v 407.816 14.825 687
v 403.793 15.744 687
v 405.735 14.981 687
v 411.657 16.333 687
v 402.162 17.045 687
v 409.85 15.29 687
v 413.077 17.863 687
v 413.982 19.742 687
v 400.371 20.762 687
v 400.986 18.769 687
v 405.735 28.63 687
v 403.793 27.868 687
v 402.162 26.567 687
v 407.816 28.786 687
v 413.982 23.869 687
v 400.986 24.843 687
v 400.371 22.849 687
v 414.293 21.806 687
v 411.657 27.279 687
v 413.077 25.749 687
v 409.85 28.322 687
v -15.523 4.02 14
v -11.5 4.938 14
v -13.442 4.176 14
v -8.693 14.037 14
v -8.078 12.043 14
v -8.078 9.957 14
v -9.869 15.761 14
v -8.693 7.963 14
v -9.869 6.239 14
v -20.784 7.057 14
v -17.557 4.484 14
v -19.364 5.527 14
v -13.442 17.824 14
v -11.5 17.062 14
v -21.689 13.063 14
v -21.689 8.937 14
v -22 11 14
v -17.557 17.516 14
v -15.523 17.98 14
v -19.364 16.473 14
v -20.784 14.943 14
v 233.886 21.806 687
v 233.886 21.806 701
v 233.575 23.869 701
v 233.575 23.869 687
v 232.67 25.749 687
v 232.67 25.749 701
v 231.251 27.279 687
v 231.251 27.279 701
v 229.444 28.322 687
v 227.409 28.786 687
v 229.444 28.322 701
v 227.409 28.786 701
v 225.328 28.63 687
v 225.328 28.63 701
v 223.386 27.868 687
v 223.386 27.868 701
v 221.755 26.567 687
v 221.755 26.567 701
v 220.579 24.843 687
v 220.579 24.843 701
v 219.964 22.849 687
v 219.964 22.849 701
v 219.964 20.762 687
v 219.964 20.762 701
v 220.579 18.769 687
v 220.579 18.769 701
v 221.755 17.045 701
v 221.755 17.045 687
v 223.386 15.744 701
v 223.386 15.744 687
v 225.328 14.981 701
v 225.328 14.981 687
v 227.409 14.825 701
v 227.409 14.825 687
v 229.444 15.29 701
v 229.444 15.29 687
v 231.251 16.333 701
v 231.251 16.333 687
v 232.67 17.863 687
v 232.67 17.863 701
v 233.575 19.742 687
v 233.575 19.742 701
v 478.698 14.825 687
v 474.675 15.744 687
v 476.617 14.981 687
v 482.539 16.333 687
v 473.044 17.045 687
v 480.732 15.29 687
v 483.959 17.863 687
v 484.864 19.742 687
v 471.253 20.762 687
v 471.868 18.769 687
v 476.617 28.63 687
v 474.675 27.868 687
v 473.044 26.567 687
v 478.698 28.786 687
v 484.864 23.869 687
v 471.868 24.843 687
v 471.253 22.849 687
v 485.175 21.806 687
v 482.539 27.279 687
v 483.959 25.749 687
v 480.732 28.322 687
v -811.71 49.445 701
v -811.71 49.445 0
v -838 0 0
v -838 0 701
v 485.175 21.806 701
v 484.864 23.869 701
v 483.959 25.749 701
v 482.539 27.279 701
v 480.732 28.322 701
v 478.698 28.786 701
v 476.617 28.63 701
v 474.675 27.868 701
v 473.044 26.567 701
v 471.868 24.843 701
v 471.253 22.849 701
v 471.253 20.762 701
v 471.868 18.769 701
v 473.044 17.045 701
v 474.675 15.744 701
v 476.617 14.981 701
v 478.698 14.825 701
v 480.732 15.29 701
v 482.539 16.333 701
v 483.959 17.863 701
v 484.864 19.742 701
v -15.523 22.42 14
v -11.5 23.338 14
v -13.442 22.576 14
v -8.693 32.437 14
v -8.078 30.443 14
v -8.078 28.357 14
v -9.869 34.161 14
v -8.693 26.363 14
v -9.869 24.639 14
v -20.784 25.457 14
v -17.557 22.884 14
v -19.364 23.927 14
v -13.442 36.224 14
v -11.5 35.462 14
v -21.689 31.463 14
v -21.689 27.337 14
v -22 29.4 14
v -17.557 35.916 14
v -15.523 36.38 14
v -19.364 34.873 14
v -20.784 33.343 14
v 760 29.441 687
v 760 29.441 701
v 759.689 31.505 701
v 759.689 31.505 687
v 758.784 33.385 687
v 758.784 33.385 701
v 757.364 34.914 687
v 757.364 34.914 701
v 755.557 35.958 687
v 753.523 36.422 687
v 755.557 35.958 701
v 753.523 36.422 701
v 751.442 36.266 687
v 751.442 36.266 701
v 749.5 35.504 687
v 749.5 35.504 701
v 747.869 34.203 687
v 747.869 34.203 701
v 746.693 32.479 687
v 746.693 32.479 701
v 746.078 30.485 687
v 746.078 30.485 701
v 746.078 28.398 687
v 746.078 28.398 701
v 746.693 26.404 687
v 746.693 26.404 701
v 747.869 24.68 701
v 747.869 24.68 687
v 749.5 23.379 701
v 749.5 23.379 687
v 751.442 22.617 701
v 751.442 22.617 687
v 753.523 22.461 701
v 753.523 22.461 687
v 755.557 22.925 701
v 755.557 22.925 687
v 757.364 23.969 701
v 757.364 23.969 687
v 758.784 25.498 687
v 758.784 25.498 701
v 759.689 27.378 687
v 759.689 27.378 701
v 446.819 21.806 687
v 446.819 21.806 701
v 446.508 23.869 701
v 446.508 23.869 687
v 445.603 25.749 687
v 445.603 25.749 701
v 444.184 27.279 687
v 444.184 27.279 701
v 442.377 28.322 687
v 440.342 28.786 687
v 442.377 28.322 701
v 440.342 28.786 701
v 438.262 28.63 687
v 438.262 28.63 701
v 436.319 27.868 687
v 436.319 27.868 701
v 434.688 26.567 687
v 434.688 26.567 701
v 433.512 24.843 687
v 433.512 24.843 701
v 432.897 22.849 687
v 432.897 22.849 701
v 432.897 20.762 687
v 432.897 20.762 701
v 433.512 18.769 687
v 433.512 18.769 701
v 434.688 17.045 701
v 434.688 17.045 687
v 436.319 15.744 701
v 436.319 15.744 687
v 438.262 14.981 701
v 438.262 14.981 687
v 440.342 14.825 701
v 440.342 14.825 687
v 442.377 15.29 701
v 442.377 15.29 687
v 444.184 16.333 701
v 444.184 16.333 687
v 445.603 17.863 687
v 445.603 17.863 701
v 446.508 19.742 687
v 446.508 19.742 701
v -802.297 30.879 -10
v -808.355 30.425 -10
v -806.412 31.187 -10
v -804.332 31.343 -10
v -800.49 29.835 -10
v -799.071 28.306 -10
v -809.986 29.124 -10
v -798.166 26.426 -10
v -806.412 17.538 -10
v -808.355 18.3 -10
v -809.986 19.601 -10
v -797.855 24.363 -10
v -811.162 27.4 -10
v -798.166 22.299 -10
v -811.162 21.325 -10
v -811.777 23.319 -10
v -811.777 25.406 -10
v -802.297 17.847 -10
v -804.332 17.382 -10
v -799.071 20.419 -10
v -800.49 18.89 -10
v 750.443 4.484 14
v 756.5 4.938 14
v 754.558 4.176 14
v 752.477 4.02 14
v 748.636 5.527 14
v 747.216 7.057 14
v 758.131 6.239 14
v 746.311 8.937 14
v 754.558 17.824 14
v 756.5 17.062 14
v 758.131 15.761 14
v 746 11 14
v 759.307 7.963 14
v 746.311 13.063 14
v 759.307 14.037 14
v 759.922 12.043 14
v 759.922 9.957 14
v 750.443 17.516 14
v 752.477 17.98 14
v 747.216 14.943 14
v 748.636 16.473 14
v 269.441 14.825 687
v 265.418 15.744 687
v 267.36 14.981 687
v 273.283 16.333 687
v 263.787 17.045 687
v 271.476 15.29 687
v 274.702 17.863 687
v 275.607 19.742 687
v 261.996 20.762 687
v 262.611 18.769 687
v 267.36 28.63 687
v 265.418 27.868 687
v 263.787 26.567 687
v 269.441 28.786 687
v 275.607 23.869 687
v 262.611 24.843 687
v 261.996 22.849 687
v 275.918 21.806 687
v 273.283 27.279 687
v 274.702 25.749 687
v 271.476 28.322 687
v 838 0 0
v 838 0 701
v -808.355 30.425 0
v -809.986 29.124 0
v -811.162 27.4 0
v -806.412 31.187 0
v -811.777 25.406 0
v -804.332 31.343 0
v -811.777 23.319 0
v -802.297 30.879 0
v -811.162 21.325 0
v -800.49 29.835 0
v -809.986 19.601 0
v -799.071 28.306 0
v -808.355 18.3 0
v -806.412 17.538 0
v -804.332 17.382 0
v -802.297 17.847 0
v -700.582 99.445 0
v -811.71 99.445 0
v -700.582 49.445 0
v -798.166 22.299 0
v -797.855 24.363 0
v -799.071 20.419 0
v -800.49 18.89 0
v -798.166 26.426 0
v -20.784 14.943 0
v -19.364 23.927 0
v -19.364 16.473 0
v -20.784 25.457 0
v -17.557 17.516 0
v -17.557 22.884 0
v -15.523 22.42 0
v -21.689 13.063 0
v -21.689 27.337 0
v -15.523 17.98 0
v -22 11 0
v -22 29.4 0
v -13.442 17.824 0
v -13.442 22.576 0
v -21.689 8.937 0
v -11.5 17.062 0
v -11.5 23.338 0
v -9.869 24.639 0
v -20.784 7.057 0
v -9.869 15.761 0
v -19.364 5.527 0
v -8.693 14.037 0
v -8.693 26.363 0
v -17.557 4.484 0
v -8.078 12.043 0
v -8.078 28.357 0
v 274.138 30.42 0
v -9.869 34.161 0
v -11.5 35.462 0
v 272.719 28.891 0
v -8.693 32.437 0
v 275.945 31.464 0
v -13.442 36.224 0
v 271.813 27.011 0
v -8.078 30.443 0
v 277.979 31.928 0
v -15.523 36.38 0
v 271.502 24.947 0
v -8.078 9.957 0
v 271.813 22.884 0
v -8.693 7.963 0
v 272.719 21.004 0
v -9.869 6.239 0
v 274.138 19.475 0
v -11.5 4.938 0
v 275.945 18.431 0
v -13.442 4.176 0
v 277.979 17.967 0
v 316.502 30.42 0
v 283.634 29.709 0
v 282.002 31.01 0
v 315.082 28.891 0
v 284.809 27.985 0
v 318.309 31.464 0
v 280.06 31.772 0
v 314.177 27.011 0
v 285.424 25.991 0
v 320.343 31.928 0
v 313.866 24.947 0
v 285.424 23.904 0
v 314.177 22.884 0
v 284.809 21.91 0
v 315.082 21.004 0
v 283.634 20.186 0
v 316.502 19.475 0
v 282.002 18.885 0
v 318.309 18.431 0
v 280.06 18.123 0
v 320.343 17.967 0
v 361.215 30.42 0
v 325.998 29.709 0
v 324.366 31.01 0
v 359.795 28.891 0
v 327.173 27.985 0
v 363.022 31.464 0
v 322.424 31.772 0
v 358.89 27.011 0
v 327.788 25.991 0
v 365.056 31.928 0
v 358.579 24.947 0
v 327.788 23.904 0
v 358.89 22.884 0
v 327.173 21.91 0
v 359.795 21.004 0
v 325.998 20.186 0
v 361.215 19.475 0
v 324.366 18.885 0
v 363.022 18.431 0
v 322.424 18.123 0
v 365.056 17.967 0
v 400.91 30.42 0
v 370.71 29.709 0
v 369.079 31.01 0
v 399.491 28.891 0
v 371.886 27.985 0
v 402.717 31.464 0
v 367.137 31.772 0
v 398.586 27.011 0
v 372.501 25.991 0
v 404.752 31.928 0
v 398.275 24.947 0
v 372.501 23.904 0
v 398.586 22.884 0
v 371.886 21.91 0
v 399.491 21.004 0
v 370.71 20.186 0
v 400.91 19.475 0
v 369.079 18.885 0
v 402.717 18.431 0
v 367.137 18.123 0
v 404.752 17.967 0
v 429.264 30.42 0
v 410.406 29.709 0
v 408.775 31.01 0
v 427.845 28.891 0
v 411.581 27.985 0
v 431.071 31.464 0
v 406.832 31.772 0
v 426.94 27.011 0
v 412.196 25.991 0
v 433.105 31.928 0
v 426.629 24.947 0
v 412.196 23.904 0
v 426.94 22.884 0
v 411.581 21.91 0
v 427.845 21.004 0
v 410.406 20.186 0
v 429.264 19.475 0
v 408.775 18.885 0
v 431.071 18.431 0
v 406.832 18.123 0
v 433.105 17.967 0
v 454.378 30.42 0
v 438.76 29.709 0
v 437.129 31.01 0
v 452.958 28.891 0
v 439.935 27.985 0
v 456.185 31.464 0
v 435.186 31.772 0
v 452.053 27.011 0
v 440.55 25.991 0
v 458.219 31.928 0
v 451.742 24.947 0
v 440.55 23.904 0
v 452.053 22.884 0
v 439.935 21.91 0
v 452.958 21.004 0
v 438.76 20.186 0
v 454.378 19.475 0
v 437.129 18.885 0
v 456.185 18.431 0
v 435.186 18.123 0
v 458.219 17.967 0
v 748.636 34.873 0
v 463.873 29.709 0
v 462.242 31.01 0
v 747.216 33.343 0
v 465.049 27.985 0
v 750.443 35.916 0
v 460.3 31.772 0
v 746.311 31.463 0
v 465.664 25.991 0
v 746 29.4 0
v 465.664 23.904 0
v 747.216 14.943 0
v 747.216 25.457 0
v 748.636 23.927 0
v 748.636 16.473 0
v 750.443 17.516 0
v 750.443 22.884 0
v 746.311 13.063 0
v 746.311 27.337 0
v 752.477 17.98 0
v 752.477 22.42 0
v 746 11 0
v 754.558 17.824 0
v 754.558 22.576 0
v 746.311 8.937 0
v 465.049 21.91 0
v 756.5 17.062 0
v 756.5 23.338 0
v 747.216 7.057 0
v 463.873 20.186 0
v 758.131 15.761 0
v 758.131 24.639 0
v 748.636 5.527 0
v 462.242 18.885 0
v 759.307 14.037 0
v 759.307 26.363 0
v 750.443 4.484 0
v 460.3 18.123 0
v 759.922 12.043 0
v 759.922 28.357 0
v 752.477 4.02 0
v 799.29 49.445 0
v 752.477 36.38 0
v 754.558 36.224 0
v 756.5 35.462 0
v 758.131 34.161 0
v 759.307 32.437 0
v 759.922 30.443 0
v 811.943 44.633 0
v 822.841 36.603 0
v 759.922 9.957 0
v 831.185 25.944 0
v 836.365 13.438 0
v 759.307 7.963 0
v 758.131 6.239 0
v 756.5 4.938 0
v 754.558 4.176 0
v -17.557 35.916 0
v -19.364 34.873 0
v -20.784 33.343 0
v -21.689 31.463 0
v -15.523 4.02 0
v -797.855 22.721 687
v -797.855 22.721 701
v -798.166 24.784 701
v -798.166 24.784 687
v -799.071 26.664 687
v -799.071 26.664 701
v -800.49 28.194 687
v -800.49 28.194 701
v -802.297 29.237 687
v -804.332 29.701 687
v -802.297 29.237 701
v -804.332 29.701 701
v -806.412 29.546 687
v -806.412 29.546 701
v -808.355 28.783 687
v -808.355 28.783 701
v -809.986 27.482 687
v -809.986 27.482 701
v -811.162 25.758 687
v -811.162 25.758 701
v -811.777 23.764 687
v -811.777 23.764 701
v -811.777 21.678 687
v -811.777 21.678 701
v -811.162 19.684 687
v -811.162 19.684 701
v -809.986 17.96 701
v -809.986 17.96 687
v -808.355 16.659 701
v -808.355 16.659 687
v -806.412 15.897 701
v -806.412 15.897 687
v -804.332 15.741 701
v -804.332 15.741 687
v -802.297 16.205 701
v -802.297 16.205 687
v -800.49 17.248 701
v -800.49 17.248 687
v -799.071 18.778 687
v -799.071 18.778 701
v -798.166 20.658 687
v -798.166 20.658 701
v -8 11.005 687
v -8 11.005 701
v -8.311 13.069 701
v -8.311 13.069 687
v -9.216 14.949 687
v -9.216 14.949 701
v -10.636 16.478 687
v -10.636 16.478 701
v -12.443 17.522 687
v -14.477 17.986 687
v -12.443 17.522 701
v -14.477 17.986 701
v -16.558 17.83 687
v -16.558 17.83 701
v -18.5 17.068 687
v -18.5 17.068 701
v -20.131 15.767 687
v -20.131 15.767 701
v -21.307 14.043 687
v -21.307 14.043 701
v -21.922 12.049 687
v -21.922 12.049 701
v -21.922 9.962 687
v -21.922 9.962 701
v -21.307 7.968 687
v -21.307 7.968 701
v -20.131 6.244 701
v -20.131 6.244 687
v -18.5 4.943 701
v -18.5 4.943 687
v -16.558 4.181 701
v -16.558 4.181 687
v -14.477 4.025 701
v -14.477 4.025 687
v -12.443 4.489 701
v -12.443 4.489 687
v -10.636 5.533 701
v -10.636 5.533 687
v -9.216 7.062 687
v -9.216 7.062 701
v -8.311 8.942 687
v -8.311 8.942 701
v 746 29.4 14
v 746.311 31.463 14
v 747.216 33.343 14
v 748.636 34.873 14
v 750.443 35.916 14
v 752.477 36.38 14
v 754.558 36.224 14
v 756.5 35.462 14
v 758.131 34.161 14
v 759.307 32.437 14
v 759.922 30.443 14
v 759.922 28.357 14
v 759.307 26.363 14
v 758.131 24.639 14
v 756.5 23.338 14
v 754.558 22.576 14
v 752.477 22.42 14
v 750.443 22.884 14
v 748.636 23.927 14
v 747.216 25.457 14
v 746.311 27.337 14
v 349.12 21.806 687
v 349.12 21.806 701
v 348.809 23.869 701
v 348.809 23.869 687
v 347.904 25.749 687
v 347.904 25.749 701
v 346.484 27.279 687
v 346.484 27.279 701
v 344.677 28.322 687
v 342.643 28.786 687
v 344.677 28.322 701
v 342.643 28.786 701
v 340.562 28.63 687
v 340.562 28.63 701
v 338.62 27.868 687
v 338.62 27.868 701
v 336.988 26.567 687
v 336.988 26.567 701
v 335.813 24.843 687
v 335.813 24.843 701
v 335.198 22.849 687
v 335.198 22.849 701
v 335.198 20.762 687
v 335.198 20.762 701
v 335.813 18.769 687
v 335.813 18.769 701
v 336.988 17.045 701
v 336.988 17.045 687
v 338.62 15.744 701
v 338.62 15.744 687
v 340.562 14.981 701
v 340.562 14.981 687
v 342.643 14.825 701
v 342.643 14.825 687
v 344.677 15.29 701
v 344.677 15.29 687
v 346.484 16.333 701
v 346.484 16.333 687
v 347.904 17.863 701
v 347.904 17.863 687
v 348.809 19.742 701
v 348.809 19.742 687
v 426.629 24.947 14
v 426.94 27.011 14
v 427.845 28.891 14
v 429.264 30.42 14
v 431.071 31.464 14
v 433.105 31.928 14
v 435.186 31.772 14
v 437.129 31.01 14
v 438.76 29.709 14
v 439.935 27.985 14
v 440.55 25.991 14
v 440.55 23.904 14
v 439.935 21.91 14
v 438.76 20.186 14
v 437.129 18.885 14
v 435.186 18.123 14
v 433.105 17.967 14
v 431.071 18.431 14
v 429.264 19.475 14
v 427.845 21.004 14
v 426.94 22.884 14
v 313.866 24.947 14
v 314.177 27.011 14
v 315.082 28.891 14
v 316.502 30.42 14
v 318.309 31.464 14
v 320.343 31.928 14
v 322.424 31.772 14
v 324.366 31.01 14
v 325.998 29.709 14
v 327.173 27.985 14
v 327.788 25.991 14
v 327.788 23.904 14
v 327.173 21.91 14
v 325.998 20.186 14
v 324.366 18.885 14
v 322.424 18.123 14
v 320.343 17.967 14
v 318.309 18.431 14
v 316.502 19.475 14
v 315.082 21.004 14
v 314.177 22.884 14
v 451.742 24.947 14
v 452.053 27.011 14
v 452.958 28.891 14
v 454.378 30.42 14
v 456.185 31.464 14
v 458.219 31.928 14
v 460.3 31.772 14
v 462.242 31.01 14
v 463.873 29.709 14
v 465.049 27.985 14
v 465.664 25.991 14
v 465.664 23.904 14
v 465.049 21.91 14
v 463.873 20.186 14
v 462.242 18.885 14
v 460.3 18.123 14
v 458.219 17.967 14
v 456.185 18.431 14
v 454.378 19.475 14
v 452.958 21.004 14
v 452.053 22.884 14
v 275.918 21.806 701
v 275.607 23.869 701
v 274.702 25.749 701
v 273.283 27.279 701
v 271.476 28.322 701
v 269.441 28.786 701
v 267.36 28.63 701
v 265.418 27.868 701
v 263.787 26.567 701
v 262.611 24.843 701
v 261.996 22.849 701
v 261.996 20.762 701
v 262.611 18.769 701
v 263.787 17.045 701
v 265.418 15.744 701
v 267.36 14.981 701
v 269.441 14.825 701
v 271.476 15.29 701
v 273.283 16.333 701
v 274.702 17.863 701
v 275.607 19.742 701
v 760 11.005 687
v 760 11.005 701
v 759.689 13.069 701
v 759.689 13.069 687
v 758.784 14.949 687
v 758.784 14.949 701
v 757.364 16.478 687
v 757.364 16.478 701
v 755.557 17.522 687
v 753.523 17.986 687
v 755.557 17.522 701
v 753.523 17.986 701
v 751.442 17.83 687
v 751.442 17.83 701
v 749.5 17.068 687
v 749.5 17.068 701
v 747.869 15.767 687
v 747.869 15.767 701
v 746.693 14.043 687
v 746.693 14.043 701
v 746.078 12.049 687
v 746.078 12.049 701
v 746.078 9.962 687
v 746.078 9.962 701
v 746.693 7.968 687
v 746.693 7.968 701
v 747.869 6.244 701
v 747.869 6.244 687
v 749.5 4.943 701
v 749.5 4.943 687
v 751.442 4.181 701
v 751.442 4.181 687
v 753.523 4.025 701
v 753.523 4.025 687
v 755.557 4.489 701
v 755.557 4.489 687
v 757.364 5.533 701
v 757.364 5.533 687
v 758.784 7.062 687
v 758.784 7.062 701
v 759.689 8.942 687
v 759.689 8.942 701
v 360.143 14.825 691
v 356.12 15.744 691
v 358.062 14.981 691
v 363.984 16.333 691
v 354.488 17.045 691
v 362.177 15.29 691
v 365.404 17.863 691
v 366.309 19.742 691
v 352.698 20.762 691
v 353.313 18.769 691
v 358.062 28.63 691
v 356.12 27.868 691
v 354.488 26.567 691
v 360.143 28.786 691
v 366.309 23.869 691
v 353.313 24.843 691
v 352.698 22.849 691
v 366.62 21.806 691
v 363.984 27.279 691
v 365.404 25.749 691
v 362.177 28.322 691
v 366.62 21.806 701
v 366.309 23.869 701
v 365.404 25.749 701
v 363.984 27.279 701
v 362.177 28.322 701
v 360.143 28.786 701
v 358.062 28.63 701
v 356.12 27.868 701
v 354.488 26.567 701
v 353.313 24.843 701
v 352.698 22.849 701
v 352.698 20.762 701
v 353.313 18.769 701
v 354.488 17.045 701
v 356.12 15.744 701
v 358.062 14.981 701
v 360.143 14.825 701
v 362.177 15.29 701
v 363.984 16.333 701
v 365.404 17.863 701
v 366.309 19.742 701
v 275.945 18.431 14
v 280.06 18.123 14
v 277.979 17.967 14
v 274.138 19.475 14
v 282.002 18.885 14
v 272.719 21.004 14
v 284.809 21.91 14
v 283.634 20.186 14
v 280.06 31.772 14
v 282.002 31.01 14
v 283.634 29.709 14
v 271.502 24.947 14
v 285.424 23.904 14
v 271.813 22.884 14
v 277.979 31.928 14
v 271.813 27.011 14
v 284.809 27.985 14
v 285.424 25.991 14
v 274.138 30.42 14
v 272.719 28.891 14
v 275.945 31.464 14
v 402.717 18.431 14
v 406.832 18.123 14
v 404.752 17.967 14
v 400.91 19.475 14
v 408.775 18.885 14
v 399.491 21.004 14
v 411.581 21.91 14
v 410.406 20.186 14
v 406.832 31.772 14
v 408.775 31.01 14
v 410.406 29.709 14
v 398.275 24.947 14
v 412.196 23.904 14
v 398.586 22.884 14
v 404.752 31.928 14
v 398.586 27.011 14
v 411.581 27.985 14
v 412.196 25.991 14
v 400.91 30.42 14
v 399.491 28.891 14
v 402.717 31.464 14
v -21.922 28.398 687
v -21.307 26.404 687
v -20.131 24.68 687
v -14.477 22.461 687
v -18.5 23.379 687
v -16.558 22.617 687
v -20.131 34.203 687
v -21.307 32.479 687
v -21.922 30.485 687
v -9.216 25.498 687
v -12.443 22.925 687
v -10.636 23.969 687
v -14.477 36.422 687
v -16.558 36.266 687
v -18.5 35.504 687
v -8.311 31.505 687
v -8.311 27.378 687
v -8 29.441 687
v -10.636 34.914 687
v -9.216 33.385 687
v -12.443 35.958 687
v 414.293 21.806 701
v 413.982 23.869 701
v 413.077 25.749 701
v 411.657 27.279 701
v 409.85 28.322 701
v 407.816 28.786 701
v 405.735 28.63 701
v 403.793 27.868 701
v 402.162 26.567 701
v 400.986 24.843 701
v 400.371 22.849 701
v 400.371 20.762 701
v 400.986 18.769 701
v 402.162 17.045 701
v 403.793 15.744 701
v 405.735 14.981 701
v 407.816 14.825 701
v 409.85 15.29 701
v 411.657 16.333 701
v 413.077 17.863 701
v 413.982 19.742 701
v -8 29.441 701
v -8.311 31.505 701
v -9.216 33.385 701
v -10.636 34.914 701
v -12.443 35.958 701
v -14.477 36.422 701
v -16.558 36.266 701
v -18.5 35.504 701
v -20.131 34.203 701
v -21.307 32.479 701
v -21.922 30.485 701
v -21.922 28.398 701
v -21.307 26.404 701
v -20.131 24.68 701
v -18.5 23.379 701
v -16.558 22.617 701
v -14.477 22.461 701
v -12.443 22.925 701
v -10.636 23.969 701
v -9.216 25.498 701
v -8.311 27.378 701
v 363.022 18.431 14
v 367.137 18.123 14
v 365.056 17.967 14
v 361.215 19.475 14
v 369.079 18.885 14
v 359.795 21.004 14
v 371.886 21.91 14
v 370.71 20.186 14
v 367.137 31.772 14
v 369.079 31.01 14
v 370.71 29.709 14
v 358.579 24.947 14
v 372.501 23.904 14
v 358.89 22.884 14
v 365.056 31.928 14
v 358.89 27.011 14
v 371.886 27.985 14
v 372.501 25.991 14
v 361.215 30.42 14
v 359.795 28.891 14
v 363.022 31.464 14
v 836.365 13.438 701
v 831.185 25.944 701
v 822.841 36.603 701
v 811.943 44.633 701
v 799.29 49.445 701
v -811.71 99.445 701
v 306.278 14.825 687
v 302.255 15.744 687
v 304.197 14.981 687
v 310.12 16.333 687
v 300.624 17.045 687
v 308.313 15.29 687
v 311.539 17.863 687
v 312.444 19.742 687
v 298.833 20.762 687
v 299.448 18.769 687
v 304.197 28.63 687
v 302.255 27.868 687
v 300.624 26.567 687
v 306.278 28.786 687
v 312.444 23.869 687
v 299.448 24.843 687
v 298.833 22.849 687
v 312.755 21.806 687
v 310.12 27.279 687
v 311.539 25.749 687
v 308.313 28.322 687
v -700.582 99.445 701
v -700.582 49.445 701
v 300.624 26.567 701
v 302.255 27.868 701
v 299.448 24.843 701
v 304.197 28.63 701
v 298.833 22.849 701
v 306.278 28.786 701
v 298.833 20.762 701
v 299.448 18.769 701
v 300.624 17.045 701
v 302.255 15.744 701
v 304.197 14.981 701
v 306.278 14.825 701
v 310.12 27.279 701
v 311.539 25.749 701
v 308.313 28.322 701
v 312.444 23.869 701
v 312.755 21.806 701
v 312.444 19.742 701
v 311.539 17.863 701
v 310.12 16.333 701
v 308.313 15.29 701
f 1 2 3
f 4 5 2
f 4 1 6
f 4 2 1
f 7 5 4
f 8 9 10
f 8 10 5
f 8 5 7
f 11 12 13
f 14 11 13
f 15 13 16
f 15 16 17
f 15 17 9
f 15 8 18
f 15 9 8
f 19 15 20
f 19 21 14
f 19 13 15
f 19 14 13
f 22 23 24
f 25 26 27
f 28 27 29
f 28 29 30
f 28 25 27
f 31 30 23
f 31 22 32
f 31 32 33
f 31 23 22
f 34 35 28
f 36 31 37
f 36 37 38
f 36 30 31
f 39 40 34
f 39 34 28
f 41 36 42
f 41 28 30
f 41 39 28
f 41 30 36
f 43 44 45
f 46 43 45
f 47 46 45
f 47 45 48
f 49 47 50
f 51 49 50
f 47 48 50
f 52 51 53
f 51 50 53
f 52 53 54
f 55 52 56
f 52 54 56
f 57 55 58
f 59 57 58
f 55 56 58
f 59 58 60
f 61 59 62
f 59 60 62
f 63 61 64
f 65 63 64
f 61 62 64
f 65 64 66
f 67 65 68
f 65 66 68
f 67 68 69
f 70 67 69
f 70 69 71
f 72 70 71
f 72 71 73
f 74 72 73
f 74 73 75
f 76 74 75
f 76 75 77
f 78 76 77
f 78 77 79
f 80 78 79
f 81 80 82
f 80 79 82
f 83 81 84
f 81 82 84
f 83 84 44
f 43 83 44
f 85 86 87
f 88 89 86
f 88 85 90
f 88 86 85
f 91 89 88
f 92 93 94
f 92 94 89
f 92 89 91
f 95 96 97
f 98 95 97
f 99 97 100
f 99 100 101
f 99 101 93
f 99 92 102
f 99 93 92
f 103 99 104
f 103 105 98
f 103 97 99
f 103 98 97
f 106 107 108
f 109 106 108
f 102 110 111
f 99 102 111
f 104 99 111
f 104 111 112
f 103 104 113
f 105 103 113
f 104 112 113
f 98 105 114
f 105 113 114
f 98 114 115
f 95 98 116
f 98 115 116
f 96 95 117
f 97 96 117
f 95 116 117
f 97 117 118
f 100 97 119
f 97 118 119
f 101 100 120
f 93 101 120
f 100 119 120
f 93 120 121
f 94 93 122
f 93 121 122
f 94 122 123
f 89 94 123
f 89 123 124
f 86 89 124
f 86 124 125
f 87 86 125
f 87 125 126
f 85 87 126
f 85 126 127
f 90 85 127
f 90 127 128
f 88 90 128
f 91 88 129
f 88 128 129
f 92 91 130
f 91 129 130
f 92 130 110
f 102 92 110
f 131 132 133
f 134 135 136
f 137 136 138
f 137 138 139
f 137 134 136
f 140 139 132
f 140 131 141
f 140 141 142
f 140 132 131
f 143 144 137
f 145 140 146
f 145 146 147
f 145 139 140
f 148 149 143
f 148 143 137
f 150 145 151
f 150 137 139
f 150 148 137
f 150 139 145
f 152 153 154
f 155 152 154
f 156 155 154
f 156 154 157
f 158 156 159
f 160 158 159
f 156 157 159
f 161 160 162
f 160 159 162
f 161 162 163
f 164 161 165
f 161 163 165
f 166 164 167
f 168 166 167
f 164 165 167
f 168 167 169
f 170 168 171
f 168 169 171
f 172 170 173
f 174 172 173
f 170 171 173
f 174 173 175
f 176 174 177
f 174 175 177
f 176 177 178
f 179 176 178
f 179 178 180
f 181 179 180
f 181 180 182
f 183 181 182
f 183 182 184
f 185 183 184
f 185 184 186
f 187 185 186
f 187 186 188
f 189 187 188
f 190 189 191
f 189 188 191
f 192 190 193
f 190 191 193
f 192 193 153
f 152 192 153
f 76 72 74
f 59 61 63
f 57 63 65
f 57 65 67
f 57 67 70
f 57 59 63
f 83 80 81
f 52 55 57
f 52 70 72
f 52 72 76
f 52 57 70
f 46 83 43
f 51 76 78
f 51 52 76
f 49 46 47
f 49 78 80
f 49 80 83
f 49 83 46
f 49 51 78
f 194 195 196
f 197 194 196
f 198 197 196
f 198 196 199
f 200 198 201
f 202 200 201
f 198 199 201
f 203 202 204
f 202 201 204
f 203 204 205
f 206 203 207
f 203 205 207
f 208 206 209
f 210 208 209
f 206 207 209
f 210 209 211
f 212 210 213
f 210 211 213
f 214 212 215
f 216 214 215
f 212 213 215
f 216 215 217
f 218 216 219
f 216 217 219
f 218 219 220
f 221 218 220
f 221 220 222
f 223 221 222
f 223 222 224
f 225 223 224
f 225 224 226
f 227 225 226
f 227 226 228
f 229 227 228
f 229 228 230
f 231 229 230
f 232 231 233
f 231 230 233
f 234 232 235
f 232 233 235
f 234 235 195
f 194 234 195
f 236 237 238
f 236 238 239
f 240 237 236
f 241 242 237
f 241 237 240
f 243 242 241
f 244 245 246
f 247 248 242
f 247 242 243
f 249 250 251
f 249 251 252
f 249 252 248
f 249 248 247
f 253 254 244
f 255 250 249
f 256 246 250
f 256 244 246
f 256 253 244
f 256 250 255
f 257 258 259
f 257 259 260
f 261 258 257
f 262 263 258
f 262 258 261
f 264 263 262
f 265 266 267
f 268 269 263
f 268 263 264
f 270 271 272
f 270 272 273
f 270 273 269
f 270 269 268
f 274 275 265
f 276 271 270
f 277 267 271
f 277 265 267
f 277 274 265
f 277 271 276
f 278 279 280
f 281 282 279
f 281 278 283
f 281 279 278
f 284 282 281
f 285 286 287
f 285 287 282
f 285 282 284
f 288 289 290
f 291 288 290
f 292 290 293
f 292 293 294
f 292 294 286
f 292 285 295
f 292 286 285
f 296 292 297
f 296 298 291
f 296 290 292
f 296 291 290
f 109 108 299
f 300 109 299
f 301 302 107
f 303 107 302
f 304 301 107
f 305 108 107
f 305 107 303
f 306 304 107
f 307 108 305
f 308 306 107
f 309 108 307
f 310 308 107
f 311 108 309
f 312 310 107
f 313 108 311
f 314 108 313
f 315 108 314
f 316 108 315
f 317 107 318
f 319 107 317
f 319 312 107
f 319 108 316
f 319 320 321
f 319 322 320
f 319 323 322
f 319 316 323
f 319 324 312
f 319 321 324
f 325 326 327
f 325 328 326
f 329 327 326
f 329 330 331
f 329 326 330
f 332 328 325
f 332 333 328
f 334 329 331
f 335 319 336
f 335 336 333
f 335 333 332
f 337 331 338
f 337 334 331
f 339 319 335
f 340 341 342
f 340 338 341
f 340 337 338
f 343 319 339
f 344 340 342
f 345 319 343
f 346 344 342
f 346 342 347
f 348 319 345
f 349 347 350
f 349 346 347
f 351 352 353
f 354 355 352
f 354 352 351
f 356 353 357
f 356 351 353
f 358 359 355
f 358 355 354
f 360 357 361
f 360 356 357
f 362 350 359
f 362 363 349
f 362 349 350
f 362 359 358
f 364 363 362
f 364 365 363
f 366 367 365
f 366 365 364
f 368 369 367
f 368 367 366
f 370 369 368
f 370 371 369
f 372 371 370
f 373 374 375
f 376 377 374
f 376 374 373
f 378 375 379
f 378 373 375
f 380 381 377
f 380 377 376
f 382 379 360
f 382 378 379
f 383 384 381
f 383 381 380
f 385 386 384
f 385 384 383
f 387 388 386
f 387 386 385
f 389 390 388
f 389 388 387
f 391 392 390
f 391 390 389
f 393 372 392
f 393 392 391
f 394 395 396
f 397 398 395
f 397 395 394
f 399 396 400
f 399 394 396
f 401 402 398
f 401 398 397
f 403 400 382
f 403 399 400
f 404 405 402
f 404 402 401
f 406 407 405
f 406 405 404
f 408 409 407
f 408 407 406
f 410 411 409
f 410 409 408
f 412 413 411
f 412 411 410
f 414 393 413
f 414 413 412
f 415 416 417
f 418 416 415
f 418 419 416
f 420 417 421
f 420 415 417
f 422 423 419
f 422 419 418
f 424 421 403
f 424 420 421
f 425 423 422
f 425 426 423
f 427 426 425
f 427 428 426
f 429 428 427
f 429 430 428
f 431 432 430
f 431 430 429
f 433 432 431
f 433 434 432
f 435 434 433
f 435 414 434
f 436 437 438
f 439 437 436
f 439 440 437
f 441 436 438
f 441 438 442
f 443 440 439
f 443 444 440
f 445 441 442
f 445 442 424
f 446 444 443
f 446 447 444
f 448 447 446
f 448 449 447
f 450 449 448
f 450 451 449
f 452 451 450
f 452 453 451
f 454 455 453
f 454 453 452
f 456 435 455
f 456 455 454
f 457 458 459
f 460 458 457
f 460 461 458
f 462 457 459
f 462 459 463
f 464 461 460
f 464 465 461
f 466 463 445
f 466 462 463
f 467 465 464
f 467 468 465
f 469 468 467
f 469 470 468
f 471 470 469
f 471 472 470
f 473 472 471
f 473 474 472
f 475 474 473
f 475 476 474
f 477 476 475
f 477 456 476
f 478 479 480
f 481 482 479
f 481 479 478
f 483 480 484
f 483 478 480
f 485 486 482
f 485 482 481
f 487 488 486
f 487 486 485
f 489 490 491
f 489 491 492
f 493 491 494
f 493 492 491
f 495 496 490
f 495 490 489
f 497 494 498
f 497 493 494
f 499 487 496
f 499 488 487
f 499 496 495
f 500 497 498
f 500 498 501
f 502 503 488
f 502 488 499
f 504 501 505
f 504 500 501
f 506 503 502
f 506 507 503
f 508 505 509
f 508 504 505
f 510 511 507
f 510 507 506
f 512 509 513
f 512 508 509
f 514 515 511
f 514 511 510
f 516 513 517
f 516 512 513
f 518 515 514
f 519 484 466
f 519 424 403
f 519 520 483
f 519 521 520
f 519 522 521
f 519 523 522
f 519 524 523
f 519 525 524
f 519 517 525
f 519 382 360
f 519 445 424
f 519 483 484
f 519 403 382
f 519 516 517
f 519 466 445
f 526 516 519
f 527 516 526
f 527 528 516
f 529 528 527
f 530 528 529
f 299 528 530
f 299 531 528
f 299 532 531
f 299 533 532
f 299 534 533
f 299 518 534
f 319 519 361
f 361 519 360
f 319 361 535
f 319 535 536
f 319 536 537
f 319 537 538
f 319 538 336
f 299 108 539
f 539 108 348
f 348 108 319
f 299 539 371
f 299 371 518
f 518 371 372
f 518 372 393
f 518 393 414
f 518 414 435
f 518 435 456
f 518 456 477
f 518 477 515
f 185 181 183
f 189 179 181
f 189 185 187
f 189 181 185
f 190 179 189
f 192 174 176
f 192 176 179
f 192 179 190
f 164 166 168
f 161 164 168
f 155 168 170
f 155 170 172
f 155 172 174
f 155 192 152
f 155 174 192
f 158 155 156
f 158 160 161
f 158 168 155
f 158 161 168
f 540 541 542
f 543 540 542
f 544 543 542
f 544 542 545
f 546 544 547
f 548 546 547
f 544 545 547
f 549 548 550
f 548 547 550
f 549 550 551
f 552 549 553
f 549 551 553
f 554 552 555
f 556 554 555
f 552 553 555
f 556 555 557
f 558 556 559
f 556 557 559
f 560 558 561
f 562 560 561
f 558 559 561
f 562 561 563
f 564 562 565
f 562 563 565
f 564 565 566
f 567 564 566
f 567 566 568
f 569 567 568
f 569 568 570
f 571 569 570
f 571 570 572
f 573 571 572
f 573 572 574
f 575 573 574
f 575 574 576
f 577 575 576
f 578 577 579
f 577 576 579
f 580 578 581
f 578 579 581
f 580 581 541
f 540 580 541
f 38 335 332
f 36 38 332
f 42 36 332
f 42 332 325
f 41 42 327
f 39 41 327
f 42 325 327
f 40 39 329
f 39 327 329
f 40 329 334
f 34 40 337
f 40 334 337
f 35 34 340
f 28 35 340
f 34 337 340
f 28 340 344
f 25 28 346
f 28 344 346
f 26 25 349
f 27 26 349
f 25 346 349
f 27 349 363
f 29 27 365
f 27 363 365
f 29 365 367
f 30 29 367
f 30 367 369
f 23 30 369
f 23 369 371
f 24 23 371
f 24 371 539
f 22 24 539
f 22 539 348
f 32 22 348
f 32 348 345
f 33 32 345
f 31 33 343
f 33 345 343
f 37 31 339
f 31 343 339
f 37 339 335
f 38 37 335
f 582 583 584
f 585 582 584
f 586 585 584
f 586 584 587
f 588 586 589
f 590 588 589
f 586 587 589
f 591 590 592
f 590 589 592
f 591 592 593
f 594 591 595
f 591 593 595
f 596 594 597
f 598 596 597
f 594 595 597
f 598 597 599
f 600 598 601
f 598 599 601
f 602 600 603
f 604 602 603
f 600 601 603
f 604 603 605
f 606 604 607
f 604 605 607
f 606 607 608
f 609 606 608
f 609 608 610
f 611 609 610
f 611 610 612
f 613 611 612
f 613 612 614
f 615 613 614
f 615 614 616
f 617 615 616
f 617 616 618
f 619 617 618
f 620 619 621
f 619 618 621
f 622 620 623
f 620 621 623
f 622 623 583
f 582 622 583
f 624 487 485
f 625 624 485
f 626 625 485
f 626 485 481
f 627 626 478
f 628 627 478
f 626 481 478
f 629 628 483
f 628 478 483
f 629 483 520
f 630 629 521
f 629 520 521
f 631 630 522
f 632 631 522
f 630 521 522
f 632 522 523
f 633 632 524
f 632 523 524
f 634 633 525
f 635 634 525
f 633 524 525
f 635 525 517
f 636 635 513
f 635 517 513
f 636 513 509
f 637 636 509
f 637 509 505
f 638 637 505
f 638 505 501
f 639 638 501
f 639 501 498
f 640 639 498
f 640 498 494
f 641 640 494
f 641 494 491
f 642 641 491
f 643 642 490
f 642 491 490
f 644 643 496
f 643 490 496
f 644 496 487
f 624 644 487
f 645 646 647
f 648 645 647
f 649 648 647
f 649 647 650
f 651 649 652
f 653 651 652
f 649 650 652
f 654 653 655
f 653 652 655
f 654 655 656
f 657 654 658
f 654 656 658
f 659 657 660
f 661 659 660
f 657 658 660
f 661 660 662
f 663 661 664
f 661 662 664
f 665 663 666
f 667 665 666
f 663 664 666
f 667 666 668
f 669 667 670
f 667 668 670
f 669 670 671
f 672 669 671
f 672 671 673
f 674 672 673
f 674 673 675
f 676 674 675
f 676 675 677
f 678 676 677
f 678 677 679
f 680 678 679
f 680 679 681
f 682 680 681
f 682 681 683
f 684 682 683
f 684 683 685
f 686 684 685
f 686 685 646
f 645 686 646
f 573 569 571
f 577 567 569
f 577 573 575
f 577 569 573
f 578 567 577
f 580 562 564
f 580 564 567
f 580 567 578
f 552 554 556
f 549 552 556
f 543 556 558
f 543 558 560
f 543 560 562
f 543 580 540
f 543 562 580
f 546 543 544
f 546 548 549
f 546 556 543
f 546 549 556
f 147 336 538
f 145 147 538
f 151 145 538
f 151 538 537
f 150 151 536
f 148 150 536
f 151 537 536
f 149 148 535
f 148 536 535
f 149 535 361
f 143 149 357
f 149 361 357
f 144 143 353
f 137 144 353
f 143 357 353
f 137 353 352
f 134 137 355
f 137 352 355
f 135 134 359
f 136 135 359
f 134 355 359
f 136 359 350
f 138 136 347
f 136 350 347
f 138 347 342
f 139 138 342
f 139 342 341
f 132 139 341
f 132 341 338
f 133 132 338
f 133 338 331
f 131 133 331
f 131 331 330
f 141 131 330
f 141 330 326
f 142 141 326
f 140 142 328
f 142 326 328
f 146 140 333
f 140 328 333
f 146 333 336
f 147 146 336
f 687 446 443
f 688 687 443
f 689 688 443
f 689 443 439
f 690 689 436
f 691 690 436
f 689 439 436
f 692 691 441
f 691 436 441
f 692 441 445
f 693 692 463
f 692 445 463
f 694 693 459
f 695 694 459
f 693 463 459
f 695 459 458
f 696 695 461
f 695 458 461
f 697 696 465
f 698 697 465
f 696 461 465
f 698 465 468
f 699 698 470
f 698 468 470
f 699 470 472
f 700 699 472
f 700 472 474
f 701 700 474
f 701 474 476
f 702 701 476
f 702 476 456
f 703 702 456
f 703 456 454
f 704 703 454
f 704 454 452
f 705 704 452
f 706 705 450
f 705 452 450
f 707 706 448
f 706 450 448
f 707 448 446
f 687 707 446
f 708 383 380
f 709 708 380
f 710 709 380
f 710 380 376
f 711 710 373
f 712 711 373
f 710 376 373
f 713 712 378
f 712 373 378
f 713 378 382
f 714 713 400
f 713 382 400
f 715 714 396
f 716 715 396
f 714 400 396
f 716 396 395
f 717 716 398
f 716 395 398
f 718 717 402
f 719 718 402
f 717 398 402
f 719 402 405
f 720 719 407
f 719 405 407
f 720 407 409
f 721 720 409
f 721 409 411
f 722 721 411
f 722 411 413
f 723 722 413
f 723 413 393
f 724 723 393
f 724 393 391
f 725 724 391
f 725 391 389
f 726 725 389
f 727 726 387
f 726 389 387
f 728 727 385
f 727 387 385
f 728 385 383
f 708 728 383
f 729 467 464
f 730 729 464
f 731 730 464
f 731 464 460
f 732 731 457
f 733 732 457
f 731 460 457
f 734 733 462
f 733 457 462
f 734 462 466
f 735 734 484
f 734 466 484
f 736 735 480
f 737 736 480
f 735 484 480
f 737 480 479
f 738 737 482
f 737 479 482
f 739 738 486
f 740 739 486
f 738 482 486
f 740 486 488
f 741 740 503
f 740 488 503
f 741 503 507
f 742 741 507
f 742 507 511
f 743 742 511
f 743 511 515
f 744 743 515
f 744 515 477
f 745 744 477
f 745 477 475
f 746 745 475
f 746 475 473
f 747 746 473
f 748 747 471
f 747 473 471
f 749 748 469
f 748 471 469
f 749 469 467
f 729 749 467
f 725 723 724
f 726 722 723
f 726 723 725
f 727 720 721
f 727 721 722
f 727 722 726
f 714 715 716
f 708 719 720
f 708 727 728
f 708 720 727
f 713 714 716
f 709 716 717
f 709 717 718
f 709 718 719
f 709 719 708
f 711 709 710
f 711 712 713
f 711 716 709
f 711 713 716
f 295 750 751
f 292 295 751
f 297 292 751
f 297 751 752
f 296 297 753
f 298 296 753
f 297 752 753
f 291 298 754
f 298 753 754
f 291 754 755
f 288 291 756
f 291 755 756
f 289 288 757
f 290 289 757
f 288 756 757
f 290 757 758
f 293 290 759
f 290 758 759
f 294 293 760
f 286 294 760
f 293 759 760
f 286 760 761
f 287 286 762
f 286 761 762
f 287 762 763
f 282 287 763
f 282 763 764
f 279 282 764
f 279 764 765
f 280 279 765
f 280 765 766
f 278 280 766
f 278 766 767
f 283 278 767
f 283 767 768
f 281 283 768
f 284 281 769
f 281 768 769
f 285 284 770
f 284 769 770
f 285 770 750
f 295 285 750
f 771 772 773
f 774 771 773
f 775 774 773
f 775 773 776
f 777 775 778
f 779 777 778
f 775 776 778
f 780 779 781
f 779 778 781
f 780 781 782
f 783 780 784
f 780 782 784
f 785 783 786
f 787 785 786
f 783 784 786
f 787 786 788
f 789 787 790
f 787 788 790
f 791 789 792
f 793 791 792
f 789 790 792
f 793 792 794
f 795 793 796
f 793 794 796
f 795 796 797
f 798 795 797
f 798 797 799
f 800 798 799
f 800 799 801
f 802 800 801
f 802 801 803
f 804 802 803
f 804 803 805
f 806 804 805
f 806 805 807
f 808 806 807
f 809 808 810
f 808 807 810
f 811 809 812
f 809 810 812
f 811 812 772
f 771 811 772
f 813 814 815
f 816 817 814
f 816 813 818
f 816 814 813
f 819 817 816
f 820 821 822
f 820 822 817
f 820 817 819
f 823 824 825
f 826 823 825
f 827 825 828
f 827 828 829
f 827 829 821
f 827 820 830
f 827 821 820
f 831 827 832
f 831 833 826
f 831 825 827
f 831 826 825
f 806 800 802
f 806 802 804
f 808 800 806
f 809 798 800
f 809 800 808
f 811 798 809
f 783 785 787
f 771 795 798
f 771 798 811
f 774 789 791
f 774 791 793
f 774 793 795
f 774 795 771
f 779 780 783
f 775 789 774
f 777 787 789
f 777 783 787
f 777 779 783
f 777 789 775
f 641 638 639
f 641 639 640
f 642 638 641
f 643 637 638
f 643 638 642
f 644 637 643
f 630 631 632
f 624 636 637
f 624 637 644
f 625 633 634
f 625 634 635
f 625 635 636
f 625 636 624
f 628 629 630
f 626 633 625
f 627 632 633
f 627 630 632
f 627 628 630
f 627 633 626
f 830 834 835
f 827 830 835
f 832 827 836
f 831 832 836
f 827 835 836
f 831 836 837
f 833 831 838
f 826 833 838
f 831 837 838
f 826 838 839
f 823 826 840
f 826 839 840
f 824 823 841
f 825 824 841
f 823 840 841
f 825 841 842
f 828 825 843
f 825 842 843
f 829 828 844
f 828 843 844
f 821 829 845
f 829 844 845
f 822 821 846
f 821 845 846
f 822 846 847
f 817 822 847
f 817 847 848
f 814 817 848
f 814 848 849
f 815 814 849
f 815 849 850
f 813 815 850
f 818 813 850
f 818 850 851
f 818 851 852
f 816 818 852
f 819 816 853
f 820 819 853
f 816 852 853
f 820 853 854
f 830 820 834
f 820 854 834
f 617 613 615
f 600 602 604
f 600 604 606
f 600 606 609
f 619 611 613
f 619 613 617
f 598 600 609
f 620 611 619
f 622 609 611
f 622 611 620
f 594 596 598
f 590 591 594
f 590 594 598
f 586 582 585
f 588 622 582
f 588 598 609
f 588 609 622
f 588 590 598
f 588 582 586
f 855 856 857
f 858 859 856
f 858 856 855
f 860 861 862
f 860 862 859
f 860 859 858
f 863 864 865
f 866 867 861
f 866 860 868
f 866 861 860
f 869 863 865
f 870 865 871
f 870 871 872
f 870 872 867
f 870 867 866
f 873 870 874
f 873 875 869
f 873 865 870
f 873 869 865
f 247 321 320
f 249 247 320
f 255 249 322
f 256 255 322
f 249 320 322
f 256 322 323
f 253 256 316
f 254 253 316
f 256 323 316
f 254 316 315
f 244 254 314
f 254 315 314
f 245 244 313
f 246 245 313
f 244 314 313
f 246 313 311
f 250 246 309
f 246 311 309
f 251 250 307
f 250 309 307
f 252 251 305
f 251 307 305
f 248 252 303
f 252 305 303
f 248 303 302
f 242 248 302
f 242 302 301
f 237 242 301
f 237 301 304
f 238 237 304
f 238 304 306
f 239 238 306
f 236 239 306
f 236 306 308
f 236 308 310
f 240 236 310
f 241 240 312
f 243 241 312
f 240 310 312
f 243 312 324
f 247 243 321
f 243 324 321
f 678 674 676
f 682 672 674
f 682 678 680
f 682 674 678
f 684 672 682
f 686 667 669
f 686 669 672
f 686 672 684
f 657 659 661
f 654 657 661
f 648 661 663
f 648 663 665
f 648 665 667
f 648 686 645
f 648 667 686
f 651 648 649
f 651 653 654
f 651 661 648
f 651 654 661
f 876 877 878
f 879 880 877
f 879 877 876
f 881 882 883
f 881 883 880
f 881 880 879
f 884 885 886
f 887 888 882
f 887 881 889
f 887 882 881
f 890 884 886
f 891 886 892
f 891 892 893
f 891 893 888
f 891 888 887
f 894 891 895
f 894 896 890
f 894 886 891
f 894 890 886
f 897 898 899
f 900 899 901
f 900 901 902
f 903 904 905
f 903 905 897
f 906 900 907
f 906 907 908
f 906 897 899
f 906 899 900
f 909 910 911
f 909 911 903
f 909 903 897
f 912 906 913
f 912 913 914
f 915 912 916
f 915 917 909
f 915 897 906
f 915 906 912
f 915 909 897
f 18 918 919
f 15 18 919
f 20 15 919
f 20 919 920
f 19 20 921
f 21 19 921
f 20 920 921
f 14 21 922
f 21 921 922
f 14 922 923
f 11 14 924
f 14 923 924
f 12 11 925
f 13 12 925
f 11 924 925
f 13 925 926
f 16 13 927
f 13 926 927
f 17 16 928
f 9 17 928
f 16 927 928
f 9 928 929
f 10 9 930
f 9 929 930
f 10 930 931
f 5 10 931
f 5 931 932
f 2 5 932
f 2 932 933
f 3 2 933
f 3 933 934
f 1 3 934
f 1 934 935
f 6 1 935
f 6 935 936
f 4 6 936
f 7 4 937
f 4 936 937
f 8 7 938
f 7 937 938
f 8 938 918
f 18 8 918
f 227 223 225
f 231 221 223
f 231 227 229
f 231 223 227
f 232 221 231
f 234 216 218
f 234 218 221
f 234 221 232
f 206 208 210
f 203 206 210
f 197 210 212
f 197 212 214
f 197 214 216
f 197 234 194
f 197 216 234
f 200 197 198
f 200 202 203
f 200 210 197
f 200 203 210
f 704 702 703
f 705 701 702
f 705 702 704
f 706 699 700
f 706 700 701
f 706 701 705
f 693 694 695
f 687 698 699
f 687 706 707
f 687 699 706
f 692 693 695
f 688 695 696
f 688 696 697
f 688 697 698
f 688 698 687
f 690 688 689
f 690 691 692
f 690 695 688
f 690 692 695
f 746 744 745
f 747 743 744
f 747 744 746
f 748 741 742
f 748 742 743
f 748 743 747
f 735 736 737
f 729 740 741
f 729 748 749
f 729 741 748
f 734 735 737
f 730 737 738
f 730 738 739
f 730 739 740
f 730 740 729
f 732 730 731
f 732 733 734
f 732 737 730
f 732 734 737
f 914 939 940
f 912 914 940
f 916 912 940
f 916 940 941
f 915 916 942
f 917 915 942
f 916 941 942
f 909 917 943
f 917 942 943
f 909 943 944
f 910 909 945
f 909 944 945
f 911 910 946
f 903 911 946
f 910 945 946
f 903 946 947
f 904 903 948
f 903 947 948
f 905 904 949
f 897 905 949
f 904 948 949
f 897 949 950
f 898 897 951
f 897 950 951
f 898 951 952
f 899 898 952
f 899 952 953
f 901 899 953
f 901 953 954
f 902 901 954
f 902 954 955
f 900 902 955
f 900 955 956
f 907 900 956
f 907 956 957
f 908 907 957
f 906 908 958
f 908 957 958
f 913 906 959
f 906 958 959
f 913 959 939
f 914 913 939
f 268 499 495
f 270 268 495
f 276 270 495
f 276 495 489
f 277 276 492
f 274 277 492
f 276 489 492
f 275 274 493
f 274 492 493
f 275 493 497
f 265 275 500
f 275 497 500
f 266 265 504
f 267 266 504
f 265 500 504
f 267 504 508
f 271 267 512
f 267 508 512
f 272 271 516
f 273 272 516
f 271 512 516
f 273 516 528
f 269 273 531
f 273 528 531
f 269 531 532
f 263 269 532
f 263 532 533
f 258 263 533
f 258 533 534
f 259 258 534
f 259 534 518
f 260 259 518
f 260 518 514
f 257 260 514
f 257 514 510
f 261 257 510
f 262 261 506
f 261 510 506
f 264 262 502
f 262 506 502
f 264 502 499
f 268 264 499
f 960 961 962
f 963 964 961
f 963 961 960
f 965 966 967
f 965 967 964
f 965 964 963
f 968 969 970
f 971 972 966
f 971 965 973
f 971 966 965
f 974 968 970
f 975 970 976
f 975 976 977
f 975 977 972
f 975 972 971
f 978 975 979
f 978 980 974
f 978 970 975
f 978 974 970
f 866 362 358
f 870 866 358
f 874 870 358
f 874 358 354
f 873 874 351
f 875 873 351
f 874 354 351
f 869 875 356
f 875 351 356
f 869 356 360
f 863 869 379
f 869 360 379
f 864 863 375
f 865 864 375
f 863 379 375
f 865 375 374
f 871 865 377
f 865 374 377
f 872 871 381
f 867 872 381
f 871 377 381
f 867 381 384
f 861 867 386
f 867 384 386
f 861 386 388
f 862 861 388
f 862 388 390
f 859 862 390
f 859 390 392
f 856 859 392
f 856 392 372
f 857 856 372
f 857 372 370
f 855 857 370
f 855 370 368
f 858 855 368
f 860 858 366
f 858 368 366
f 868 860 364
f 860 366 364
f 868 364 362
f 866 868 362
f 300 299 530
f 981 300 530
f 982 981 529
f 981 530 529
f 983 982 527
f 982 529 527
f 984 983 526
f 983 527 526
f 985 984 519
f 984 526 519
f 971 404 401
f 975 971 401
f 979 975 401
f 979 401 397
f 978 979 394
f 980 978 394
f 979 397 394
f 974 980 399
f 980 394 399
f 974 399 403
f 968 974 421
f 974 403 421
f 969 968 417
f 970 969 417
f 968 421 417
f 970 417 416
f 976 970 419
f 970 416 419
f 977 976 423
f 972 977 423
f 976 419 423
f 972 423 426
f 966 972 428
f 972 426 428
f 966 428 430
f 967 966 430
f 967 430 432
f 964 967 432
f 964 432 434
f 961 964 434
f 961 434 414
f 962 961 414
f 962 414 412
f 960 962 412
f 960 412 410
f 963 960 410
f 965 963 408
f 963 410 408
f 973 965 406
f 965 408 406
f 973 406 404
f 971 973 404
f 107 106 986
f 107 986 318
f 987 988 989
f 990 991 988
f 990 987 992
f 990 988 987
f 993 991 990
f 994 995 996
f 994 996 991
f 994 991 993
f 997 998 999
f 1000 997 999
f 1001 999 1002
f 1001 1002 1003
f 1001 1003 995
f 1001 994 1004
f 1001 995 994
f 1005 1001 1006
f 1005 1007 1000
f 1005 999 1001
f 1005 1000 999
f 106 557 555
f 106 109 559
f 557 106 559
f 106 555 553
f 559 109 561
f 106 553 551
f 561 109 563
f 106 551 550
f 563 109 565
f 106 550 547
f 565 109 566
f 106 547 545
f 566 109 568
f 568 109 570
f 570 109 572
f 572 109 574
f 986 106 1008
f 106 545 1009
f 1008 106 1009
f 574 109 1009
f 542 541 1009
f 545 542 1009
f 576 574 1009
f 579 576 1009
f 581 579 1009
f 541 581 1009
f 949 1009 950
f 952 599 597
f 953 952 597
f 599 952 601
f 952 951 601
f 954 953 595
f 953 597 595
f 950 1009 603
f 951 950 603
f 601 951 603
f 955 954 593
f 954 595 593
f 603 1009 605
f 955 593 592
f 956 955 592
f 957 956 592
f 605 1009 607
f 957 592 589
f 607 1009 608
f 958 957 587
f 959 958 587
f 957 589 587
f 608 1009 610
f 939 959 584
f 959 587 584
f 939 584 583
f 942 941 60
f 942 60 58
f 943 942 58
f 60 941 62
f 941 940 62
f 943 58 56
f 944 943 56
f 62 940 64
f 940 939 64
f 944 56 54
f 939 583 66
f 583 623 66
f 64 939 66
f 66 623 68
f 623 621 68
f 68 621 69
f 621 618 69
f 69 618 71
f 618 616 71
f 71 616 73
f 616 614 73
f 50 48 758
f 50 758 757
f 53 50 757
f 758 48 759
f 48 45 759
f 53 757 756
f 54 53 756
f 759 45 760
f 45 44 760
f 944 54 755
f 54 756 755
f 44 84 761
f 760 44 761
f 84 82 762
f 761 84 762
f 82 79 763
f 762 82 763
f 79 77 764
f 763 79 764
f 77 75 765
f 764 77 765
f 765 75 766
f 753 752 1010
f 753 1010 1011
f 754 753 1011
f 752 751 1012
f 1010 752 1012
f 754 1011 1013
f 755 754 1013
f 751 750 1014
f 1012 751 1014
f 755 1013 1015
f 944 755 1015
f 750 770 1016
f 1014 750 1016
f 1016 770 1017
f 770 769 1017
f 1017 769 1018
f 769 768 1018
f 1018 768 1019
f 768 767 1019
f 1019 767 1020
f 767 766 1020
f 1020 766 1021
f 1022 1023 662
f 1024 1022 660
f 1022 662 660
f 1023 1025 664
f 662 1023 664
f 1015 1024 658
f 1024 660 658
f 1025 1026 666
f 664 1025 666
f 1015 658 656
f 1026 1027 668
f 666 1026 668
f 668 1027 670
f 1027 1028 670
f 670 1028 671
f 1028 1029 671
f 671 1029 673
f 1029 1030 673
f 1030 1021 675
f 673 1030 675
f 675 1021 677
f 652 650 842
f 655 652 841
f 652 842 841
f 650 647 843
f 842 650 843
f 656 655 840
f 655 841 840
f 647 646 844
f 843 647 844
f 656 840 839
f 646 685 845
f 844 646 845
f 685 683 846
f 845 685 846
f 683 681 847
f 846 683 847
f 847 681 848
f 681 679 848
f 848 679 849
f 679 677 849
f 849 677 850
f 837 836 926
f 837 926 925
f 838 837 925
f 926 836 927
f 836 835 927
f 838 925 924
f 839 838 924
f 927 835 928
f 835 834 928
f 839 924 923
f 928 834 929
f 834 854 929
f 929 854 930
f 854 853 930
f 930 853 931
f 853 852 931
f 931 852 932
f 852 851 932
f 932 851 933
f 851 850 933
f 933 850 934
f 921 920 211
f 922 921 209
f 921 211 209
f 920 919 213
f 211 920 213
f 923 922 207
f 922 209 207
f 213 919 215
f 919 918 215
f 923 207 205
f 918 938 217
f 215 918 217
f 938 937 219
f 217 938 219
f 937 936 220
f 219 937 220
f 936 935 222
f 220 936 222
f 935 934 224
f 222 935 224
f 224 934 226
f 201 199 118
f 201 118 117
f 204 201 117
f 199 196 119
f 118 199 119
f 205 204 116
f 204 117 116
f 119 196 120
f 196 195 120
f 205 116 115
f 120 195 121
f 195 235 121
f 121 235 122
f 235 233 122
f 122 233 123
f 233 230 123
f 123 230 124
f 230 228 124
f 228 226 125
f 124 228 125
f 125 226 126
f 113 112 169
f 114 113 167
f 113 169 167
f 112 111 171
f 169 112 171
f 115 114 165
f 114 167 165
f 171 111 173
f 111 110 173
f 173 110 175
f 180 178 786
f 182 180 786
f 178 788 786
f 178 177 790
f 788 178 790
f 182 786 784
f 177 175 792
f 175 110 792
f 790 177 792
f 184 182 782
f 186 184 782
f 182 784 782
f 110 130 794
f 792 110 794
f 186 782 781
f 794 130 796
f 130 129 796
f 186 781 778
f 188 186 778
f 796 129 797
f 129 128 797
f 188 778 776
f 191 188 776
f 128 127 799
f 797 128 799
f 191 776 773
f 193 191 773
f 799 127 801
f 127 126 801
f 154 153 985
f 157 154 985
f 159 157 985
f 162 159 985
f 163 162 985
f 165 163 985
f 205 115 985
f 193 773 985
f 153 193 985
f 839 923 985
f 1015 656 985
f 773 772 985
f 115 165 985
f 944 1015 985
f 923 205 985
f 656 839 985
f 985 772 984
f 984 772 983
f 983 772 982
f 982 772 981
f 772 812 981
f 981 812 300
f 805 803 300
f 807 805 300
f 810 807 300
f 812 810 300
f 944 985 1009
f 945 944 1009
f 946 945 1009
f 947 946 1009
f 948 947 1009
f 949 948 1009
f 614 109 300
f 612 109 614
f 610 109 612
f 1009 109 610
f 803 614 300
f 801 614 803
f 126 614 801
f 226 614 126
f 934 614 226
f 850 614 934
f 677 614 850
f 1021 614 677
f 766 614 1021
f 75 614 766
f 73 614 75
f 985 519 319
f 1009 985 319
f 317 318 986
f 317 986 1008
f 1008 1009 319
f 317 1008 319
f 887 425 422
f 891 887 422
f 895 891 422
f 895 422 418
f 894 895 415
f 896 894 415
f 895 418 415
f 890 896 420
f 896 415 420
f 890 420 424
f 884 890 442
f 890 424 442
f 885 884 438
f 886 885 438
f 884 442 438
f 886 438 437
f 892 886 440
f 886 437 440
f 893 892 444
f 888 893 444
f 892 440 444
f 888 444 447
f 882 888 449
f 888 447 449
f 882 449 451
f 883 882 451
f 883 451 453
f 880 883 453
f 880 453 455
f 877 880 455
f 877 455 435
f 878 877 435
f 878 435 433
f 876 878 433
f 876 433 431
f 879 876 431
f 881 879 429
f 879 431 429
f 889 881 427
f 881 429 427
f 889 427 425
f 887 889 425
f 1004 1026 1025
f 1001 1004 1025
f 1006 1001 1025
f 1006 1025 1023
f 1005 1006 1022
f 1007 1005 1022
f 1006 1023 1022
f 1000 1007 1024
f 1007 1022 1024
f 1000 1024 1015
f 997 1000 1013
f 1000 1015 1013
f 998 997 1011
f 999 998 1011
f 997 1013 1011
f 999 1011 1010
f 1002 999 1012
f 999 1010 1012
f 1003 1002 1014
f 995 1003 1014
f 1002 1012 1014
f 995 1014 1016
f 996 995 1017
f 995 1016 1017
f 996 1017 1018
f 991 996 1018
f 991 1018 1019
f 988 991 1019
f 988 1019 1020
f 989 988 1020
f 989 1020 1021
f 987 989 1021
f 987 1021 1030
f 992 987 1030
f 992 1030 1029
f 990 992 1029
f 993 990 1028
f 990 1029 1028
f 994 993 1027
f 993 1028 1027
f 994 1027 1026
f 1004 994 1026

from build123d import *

# Parameters (mm, degrees)
BOSS_EXTRUDE1_DEPTH = 701
SKETCH3_R           = 7
CUT_EXTRUDE1_DEPTH  = 14
SKETCH4_R           = 7
CUT_EXTRUDE2_DEPTH  = 14
SKETCH5_R           = 7
CUT_EXTRUDE3_DEPTH  = 14
SKETCH6_R           = 7
BOSS_EXTRUDE2_DEPTH = 10
SKETCH7_R           = 7
CUT_EXTRUDE4_DEPTH  = 14
SKETCH8_R           = 7
CUT_EXTRUDE5_DEPTH  = 14
SKETCH9_R           = 7
CUT_EXTRUDE6_DEPTH  = 14
SKETCH10_R          = 7
CUT_EXTRUDE7_DEPTH  = 10
SKETCH11_W          = 111.127913471
SKETCH11_H          = 701
BOSS_EXTRUDE3_DEPTH = 50


with BuildPart() as part:
    # Sketch2 → Boss-Extrude1 (new body)
    with BuildSketch(Plane.XY):
        with BuildLine():
            Line((-838, 0), (838, 0))
            ThreePointArc((838, 0), (827.375455805, 31.557279357), (799.290407516, 49.4450652))
            Line((799.290407516, 49.4450652), (-811.709592484, 49.4450652))
            Line((-811.709592484, 49.4450652), (-838, 0))
        make_face()
    extrude(amount=BOSS_EXTRUDE1_DEPTH)

    # Sketch3 → Cut-Extrude1 (cut)
    with BuildSketch(Plane.XY.offset(701)):
        with Locations((753, 11.005388452)):
            Circle(SKETCH3_R)
        with Locations((753, 29.441497119)):
            Circle(SKETCH3_R)
        with Locations((-15, 29.441497119)):
            Circle(SKETCH3_R)
        with Locations((-15, 11.005388452)):
            Circle(SKETCH3_R)
    extrude(amount=-CUT_EXTRUDE1_DEPTH, mode=Mode.SUBTRACT)

    # Sketch4 → Cut-Extrude2 (cut)
    with BuildSketch(Plane(origin=(0, 0, 0), x_dir=(-1, 0, 0), z_dir=(0, 0, -1))):
        with Locations((-753, 11)):
            Circle(SKETCH4_R)
        with Locations((-753, 29.4)):
            Circle(SKETCH4_R)
        with Locations((15, 11)):
            Circle(SKETCH4_R)
        with Locations((15, 29.4)):
            Circle(SKETCH4_R)
    extrude(amount=-CUT_EXTRUDE2_DEPTH, mode=Mode.SUBTRACT)

    # Sketch5 → Cut-Extrude3 (cut)
    with BuildSketch(Plane(origin=(0, 0, 0), x_dir=(-1, 0, 0), z_dir=(0, 0, -1))):
        with Locations((-320.866149007, 24.947412588)):
            Circle(SKETCH5_R)
        with Locations((-278.502426445, 24.947412588)):
            Circle(SKETCH5_R)
    extrude(amount=-CUT_EXTRUDE3_DEPTH, mode=Mode.SUBTRACT)

    # Sketch6 → Boss-Extrude2 (add)
    with BuildSketch(Plane(origin=(0, 0, 0), x_dir=(-1, 0, 0), z_dir=(0, 0, -1))):
        with Locations(Location((804.854796242, 24.362661379, 0), (0, 0, 180))):
            Circle(SKETCH6_R)
    extrude(amount=BOSS_EXTRUDE2_DEPTH)

    # Sketch7 → Cut-Extrude4 (cut)
    with BuildSketch(Plane(origin=(0, 0, 0), x_dir=(-1, 0, 0), z_dir=(0, 0, -1))):
        with Locations((-365.57912829, 24.947412588)):
            Circle(SKETCH7_R)
        with Locations((-405.274636015, 24.947412588)):
            Circle(SKETCH7_R)
        with Locations((-458.742054583, 24.947412588)):
            Circle(SKETCH7_R)
        with Locations((-433.628570104, 24.947412588)):
            Circle(SKETCH7_R)
    extrude(amount=-CUT_EXTRUDE4_DEPTH, mode=Mode.SUBTRACT)

    # Sketch8 → Cut-Extrude5 (cut)
    with BuildSketch(Plane.XY.offset(701)):
        with Locations((226.886142598, 21.805746879)):
            Circle(SKETCH8_R)
        with Locations((268.91811361, 21.805746879)):
            Circle(SKETCH8_R)
        with Locations((305.755121912, 21.805746879)):
            Circle(SKETCH8_R)
        with Locations((342.119860878, 21.805746879)):
            Circle(SKETCH8_R)
        with Locations((407.293029413, 21.805746879)):
            Circle(SKETCH8_R)
        with Locations((439.819163205, 21.805746879)):
            Circle(SKETCH8_R)
        with Locations((478.174989696, 21.805746879)):
            Circle(SKETCH8_R)
    extrude(amount=-CUT_EXTRUDE5_DEPTH, mode=Mode.SUBTRACT)

    # Sketch9 → Cut-Extrude6 (cut)
    with BuildSketch(Plane.XY.offset(701)):
        with Locations((-804.854796242, 22.721056166)):
            Circle(SKETCH9_R)
    extrude(amount=-CUT_EXTRUDE6_DEPTH, mode=Mode.SUBTRACT)

    # Sketch10 → Cut-Extrude7 (cut)
    with BuildSketch(Plane.XY.offset(701)):
        with Locations((342.119860878, 21.805746879)):
            Circle(SKETCH10_R)
        with Locations((359.619860878, 21.805746879)):
            Circle(SKETCH10_R)
    extrude(amount=-CUT_EXTRUDE7_DEPTH, mode=Mode.SUBTRACT)

    # Sketch11 → Boss-Extrude3 (add)
    with BuildSketch(Plane(origin=(0, 49.4450652, 0), x_dir=(1, 0, 0), z_dir=(0, 1, 0))):
        with Locations((-756.145635749, -350.5)):
            Rectangle(SKETCH11_W, SKETCH11_H)
    extrude(amount=BOSS_EXTRUDE3_DEPTH)


solid = part.part
